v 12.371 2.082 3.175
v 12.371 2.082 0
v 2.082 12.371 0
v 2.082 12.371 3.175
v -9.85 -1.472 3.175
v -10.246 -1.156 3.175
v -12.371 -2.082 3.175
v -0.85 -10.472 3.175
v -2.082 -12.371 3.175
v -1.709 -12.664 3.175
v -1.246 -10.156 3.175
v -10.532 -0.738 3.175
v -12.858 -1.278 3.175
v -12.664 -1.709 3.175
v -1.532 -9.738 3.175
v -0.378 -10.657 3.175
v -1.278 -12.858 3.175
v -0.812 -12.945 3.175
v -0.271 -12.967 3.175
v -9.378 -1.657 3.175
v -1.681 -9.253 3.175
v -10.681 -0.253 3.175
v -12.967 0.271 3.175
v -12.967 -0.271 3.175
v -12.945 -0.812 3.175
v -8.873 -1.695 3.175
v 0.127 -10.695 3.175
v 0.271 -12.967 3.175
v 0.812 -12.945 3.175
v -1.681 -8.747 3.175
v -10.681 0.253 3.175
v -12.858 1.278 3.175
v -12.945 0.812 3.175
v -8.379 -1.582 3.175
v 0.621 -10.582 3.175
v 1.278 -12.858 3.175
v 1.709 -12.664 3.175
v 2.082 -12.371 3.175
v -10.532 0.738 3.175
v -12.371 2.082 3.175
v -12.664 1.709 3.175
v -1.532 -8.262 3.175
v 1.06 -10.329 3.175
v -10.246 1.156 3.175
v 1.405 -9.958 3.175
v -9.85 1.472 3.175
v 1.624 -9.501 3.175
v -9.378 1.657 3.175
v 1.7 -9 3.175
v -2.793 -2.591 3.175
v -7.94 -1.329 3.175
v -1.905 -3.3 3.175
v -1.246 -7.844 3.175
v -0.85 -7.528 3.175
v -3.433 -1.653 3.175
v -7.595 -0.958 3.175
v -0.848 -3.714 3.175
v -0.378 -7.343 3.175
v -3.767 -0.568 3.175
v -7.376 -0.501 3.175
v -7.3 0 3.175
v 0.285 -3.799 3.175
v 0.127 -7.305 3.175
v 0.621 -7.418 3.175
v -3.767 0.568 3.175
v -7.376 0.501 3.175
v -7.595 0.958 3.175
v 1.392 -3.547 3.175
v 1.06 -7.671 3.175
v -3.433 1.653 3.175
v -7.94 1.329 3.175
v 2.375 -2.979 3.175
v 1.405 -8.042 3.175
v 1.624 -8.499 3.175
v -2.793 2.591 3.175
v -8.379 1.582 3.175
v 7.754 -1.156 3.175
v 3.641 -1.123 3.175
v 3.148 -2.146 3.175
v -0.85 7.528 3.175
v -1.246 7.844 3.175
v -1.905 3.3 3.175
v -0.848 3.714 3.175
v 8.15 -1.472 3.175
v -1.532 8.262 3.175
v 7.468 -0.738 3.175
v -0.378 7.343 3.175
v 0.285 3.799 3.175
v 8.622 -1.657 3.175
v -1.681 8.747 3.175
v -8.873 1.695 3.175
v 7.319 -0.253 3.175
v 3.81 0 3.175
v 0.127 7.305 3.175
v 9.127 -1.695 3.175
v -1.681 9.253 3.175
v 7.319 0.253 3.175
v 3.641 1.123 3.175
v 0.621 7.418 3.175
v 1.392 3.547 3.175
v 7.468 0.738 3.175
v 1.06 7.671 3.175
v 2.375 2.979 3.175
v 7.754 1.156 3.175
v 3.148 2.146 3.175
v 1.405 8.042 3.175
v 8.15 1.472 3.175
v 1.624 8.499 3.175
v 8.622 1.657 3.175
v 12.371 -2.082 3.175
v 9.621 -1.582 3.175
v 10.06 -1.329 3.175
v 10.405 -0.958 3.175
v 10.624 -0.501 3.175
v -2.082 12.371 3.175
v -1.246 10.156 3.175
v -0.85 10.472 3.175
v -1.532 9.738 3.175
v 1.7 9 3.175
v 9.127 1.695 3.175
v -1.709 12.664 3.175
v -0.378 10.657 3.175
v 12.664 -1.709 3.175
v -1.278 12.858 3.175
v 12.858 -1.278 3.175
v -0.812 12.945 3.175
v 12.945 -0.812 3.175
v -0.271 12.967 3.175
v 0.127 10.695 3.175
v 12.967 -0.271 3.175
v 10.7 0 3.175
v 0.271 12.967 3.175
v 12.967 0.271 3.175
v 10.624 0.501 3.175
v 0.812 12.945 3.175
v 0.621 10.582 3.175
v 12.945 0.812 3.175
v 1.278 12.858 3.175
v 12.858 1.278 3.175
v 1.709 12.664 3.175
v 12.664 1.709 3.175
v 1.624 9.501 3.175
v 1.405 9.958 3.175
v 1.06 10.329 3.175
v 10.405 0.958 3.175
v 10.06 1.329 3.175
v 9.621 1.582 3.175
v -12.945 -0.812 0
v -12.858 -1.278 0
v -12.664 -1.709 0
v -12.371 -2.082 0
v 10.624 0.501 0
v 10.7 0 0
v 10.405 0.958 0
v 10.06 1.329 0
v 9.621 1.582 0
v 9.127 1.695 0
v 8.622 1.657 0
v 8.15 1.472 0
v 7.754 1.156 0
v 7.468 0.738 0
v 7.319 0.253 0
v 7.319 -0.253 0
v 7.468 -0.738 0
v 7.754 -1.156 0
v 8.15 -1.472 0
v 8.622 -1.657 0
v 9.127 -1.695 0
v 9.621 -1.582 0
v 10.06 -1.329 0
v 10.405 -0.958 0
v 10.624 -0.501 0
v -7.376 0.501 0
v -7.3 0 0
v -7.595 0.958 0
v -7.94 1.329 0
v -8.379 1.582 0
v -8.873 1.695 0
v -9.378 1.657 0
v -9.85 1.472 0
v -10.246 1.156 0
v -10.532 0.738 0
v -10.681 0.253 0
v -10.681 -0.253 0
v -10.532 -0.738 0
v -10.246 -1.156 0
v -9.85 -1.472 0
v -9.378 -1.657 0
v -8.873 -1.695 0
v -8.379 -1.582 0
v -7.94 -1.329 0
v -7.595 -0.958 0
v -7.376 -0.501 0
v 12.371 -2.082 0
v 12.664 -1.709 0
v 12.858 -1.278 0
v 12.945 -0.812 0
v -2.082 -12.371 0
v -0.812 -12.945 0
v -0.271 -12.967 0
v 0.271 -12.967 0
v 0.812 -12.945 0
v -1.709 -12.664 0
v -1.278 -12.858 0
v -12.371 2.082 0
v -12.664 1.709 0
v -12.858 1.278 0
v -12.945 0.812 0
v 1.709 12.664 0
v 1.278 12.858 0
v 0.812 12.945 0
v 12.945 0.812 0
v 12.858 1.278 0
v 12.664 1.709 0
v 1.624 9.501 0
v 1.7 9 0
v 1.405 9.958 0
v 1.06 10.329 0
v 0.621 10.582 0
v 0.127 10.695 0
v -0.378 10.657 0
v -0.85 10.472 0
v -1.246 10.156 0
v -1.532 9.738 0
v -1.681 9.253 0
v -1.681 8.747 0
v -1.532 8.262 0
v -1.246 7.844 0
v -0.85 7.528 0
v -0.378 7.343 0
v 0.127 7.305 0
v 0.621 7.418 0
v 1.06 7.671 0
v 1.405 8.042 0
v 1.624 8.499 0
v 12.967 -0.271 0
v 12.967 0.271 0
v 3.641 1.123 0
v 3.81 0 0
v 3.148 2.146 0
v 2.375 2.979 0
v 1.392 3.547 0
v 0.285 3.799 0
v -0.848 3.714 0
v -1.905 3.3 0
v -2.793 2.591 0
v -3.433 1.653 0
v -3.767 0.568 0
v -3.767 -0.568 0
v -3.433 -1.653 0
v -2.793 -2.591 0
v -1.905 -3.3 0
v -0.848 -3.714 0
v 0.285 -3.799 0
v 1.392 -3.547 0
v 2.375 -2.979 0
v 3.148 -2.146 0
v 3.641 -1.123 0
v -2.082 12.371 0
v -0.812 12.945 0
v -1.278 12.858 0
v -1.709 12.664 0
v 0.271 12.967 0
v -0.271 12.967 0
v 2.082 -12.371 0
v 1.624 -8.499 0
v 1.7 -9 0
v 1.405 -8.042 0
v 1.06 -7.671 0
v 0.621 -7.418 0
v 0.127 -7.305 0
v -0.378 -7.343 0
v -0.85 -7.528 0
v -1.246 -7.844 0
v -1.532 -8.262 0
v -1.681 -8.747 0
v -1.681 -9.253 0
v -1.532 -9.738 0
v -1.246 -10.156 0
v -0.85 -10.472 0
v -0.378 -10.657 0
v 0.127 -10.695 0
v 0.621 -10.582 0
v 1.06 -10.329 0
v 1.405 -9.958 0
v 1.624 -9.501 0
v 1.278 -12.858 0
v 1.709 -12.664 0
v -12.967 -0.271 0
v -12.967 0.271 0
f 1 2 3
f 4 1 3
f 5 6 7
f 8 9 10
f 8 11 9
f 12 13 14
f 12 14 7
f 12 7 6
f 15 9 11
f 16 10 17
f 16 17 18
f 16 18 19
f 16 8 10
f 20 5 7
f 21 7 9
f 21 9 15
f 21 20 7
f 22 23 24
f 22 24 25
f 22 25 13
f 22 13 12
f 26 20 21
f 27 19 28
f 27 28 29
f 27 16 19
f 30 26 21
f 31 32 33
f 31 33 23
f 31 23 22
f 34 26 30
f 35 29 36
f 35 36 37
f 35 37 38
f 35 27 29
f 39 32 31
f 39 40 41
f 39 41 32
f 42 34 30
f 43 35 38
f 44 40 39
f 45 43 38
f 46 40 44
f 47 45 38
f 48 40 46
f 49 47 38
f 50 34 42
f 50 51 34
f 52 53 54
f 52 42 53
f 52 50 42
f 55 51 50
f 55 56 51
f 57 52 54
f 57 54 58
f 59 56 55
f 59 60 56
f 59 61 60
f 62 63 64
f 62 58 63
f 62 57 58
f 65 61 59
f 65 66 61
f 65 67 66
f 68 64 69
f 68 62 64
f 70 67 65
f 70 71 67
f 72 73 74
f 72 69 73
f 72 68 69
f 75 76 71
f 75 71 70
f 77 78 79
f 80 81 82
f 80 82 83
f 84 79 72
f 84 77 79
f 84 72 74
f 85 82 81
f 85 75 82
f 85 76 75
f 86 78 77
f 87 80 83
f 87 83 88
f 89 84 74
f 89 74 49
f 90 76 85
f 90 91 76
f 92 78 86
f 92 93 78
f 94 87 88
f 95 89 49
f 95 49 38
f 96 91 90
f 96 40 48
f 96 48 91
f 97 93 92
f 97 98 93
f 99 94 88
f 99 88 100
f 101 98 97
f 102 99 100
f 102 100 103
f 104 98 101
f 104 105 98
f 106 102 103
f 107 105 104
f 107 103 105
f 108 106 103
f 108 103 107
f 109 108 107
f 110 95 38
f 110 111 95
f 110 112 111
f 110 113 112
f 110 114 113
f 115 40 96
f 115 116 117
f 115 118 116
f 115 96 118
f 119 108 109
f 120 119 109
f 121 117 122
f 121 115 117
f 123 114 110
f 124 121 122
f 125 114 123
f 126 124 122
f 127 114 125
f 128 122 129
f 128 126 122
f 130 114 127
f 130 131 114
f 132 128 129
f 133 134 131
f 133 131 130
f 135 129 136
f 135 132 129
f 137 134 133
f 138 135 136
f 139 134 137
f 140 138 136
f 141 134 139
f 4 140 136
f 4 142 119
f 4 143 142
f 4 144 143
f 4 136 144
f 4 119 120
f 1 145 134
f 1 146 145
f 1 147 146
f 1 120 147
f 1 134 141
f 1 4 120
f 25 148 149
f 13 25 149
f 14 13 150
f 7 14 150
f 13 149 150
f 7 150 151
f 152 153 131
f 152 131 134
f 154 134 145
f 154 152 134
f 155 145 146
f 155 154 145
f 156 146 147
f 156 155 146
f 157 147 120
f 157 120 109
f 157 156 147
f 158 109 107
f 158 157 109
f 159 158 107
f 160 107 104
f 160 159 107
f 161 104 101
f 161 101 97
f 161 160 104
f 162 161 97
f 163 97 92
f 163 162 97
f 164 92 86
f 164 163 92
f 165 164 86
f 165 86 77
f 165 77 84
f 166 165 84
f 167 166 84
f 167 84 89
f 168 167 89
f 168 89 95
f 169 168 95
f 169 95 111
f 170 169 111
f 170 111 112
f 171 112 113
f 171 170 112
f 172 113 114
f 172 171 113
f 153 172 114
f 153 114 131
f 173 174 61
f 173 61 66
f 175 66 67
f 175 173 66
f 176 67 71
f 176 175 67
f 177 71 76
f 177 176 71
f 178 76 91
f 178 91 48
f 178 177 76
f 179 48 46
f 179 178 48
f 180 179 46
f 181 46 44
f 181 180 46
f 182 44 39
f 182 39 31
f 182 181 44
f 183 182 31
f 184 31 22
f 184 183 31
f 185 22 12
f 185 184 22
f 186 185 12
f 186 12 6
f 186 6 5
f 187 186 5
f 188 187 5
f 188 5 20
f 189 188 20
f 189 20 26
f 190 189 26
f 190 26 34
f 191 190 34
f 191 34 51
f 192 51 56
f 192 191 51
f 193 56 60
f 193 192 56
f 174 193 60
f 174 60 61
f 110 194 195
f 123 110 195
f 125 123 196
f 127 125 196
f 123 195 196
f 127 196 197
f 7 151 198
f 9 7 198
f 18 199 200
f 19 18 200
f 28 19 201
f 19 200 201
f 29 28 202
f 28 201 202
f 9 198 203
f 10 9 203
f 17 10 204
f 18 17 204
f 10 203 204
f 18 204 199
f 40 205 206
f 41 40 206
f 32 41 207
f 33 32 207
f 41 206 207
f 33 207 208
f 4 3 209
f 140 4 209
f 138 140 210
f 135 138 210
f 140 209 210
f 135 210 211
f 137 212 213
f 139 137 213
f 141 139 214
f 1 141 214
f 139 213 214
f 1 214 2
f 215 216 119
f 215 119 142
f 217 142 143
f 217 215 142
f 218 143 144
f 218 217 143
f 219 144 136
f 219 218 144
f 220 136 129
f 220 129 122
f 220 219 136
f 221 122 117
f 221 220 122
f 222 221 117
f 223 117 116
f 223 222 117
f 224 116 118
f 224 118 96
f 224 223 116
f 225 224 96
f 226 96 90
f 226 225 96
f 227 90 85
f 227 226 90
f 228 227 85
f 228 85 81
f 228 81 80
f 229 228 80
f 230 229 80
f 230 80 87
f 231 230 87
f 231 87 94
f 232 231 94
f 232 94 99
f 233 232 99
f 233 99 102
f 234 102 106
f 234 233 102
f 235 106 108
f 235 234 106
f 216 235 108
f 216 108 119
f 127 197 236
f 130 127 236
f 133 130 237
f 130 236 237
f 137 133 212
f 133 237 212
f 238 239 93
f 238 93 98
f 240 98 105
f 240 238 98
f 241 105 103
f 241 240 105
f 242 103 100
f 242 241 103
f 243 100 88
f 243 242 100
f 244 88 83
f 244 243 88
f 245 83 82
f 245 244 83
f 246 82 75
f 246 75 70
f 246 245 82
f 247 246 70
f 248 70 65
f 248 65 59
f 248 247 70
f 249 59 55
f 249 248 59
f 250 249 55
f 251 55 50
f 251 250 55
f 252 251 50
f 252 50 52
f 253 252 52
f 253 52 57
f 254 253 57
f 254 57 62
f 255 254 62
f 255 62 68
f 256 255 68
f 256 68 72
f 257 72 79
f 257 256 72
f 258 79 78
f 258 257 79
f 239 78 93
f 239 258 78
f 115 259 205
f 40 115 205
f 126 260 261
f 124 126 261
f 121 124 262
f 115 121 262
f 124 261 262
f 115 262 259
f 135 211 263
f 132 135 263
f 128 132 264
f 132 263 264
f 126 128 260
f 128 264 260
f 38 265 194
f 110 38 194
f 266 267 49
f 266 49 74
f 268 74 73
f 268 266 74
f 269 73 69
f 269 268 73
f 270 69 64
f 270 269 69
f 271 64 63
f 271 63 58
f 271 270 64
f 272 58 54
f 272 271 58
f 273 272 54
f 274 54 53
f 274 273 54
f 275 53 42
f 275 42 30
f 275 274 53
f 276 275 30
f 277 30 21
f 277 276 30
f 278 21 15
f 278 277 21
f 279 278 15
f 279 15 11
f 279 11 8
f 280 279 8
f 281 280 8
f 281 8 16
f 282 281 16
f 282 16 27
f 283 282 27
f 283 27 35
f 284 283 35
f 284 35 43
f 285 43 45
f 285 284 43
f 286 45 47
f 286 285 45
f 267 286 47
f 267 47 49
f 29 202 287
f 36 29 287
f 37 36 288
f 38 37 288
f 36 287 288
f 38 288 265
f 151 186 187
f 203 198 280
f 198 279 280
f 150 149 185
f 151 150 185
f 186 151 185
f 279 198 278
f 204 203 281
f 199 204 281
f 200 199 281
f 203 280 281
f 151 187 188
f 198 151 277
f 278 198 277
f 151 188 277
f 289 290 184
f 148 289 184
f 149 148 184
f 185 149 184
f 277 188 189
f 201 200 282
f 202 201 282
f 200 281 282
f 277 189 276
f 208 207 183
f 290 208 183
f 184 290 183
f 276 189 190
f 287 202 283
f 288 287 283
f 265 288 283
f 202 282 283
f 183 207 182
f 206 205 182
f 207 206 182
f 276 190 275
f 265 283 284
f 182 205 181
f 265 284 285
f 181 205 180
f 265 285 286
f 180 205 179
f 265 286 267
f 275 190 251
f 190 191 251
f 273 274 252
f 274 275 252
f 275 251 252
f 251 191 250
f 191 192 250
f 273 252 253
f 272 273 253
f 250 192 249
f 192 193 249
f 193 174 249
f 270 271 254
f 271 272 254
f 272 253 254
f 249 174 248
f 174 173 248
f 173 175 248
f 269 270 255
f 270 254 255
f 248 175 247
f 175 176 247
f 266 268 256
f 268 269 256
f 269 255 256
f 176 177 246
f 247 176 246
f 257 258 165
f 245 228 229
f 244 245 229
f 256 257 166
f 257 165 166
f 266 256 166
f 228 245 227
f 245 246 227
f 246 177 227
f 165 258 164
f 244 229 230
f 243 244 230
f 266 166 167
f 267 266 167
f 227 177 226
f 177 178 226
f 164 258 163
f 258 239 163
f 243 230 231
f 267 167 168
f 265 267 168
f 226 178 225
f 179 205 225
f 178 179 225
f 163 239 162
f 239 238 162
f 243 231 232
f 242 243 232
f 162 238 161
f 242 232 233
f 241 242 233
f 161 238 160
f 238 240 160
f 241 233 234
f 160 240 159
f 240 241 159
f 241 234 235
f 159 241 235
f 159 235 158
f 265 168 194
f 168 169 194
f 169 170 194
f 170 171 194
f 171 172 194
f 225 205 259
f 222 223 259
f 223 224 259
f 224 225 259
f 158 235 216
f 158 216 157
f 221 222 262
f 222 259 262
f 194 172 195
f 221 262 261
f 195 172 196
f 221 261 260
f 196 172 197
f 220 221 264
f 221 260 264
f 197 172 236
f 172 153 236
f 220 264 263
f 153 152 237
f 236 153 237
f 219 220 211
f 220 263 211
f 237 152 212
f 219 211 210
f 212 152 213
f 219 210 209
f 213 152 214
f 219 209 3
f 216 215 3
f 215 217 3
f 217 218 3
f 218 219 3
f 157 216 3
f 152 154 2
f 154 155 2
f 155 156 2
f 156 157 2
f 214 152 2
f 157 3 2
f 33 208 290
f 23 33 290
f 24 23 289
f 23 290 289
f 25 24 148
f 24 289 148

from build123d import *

# Parameters (mm, degrees)
SKETCH1_R           = 1.7
SKETCH1_R_2         = 3.81
BOSS_EXTRUDE1_DEPTH = 3.175


with BuildPart() as part:
    # Sketch1 → Boss-Extrude1 (new body)
    with BuildSketch(Plane.XY):
        with BuildLine():
            Line((-2.081852397, 12.371410211), (-12.371410211, 2.081852397))
            ThreePointArc((-12.371410211, 2.081852397), (-12.773942372, 1.499384559), (-12.944543252, 0.812219176))
            ThreePointArc((-12.944543252, 0.812219176), (-12.97, 0), (-12.944543252, -0.812219176))
            ThreePointArc((-12.944543252, -0.812219176), (-12.773942372, -1.499384559), (-12.371410211, -2.081852397))
            Line((-12.371410211, -2.081852397), (-2.081852397, -12.371410211))
            ThreePointArc((-2.081852397, -12.371410211), (-1.499384559, -12.773942372), (-0.812219176, -12.944543252))
            ThreePointArc((-0.812219176, -12.944543252), (0, -12.97), (0.812219176, -12.944543252))
            ThreePointArc((0.812219176, -12.944543252), (1.499384559, -12.773942372), (2.081852397, -12.371410211))
            Line((2.081852397, -12.371410211), (12.371410211, -2.081852397))
            ThreePointArc((12.371410211, -2.081852397), (12.773942372, -1.499384559), (12.944543252, -0.812219176))
            ThreePointArc((12.944543252, -0.812219176), (12.97, 0), (12.944543252, 0.812219176))
            ThreePointArc((12.944543252, 0.812219176), (12.773942372, 1.499384559), (12.371410211, 2.081852397))
            Line((12.371410211, 2.081852397), (2.081852397, 12.371410211))
            ThreePointArc((2.081852397, 12.371410211), (1.499384559, 12.773942372), (0.812219176, 12.944543252))
            ThreePointArc((0.812219176, 12.944543252), (0, 12.97), (-0.812219176, 12.944543252))
            ThreePointArc((-0.812219176, 12.944543252), (-1.499384559, 12.773942372), (-2.081852397, 12.371410211))
        make_face()
        with Locations((0, -9)):
            Circle(SKETCH1_R, mode=Mode.SUBTRACT)
        with Locations((-9, 0)):
            Circle(SKETCH1_R, mode=Mode.SUBTRACT)
        with Locations((0, 9)):
            Circle(SKETCH1_R, mode=Mode.SUBTRACT)
        with Locations((9, 0)):
            Circle(SKETCH1_R, mode=Mode.SUBTRACT)
        Circle(SKETCH1_R_2, mode=Mode.SUBTRACT)
    extrude(amount=BOSS_EXTRUDE1_DEPTH)


solid = part.part
